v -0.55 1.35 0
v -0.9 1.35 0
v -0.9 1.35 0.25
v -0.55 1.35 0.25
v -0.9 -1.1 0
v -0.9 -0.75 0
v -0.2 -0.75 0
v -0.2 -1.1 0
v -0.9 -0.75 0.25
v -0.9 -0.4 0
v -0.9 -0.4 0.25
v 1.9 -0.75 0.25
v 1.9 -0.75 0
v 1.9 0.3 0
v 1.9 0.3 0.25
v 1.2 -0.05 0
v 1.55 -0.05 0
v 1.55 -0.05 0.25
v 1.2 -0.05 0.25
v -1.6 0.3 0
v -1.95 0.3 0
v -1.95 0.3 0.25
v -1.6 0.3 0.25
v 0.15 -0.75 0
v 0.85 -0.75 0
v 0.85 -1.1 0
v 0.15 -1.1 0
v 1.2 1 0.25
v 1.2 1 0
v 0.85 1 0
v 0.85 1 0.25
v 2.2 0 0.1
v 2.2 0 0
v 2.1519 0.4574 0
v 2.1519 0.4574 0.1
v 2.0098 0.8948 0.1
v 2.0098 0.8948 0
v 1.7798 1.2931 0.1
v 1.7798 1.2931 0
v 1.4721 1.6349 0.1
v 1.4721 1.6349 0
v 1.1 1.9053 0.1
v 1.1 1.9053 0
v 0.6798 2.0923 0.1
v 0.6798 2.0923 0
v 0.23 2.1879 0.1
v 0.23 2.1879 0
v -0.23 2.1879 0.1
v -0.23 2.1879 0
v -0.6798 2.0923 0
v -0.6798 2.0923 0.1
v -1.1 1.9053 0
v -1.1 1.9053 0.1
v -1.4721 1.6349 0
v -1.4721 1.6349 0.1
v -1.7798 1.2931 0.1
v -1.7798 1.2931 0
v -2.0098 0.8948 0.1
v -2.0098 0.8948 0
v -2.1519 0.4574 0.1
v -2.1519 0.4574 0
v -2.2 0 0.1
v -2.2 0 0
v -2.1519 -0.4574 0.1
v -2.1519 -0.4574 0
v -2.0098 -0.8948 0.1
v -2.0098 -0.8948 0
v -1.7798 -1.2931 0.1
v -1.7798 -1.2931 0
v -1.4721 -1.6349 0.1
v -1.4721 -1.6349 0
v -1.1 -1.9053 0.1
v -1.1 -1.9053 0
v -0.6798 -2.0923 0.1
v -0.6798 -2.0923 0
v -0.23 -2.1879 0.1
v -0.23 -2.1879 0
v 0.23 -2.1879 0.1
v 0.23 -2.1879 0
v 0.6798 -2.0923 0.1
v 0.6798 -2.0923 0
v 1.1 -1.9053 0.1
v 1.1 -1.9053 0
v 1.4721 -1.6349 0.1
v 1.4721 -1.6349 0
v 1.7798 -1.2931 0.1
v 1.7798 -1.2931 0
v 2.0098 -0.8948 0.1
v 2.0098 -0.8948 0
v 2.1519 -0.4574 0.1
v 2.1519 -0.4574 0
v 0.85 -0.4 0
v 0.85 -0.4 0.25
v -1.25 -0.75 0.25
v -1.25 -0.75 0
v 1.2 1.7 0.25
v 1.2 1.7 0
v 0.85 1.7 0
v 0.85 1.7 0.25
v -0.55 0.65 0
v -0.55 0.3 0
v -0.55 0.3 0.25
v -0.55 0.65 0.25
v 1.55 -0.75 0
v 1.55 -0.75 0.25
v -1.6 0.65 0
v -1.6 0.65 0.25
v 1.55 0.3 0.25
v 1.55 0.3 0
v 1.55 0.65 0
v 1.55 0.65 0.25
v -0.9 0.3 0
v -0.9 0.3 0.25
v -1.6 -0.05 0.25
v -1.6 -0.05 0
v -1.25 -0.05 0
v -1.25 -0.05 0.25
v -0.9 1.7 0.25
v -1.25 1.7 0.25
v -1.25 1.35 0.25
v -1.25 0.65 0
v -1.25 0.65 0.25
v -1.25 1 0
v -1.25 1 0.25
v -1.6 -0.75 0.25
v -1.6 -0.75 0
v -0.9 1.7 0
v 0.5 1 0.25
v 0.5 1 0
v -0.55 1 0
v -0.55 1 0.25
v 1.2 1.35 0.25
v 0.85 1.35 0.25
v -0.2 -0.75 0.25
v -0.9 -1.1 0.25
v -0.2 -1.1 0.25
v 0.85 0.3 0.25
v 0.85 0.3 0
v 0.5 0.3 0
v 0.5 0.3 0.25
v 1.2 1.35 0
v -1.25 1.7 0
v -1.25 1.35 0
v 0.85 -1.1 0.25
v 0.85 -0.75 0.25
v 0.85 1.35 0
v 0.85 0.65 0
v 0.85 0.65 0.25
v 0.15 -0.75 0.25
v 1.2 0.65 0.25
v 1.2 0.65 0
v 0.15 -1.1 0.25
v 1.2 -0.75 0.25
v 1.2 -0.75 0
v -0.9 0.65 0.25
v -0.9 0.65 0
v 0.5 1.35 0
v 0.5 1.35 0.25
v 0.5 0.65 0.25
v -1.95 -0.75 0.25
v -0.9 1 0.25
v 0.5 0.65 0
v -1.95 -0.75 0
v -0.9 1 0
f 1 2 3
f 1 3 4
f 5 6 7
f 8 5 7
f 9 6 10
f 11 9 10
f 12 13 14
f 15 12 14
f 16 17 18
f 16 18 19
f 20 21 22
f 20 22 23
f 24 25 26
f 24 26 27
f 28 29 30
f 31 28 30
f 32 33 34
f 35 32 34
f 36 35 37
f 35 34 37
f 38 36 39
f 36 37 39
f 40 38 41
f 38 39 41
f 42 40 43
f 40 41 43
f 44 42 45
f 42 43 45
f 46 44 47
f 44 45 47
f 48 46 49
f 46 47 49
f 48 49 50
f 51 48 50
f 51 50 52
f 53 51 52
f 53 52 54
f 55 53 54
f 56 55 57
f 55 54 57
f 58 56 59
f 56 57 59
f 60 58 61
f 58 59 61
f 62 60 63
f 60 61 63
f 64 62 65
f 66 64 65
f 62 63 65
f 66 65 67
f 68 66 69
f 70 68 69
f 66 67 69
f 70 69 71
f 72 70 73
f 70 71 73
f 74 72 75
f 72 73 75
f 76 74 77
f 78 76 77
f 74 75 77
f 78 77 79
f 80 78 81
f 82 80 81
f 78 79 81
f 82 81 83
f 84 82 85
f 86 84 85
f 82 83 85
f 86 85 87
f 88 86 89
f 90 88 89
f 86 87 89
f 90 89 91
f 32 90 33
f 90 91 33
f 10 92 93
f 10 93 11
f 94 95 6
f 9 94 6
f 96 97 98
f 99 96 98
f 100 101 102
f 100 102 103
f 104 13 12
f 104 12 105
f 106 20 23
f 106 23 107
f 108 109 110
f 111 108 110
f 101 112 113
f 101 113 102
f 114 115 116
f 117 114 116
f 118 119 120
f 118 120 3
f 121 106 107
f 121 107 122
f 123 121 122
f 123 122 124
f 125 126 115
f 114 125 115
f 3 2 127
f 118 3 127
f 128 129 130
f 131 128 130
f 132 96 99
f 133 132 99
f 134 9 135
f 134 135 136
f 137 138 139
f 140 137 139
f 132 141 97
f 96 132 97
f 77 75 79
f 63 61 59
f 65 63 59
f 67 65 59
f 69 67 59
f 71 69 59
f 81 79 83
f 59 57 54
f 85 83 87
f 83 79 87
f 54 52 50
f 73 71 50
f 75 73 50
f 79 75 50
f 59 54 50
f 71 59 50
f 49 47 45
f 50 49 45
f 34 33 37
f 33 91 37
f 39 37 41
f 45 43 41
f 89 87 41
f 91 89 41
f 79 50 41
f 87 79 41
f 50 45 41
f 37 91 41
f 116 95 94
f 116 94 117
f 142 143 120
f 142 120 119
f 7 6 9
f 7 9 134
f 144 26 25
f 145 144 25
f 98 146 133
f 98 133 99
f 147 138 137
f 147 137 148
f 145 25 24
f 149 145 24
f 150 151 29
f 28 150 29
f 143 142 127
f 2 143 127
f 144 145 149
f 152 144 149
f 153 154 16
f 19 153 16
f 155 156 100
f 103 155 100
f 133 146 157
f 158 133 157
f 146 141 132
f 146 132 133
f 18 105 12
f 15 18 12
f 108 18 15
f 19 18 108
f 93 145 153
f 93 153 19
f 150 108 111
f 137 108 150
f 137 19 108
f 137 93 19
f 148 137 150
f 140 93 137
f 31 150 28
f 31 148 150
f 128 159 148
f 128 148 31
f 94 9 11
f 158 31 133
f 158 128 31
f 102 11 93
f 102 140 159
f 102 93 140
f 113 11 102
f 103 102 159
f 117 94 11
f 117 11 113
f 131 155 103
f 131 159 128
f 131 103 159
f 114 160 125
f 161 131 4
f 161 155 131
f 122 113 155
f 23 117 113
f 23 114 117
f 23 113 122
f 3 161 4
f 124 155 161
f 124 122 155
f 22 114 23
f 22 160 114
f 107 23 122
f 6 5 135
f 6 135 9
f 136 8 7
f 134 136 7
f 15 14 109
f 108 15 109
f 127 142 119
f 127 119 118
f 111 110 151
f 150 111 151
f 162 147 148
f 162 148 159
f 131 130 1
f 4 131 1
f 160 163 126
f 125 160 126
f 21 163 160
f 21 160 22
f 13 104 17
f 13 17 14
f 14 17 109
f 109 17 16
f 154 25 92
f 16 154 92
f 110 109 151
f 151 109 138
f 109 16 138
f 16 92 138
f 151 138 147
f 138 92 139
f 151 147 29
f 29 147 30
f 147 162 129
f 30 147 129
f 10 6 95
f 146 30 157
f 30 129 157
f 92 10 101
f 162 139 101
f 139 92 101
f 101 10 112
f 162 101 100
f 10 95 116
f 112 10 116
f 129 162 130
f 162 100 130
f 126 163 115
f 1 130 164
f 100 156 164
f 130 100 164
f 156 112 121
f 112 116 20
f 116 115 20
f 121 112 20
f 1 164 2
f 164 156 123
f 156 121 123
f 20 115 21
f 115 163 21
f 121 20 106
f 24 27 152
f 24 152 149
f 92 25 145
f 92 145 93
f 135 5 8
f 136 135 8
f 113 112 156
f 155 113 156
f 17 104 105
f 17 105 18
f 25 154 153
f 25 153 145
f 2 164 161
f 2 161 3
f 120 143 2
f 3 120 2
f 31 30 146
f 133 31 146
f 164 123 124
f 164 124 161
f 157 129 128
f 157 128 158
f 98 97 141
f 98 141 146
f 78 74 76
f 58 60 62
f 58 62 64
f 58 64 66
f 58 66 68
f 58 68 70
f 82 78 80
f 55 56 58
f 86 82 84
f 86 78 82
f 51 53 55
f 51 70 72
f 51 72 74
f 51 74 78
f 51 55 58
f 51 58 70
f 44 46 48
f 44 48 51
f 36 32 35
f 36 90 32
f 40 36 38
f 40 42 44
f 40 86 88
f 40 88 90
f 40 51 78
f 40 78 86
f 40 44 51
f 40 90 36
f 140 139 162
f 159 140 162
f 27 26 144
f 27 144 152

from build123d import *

# Parameters (mm, degrees)
CYLINDER_R     = 2.2
CYLINDER_DEPTH = 0.1
BOX009_W       = 0.35
BOX009_H       = 0.7
BOX009_DEPTH   = 1
BOX010_W       = 1.05
BOX010_H       = 0.35
BOX010_DEPTH   = 1
BOX007_W       = 1.75
BOX007_H       = 0.35
BOX007_DEPTH   = 0.25
BOX001_W       = 0.35
BOX001_H       = 0.35
BOX001_DEPTH   = 1
BOX003_W       = 1.4
BOX003_H       = 0.35
BOX003_DEPTH   = 0.25
BOX008_W       = 0.35
BOX008_H       = 0.35
BOX008_DEPTH   = 0.25
BOX005_W       = 1.75
BOX005_H       = 0.35
BOX005_DEPTH   = 0.25
BOX004_W       = 1.75
BOX004_H       = 0.35
BOX004_DEPTH   = 0.25
BOX002_W       = 1.05
BOX002_H       = 0.35
BOX002_DEPTH   = 0.25
BOX_W          = 0.35
BOX_H          = 0.35
BOX_DEPTH      = 0.25
BOX012_W       = 1.05
BOX012_H       = 0.35
BOX012_DEPTH   = 1
BOX011_W       = 1.75
BOX011_H       = 0.35
BOX011_DEPTH   = 1
BOX006_W       = 1.75
BOX006_H       = 0.35
BOX006_DEPTH   = 0.25
BOX013_W       = 1.4
BOX013_H       = 0.35
BOX013_DEPTH   = 0.25


with BuildPart() as cylinder:
    # Cylinder → Cylinder (new body)
    with BuildSketch(Plane.XY):
        Circle(CYLINDER_R)
    extrude(amount=CYLINDER_DEPTH)


with BuildPart() as cube009:
    # Box009 → Box009 (new body)
    with BuildSketch(Plane(origin=(-1.35, -1.1, 0), x_dir=(1, 0, 0), z_dir=(0, 0, 1))):
        with Locations((0.175, 0.35)):
            Rectangle(BOX009_W, BOX009_H)
    extrude(amount=BOX009_DEPTH)


with BuildPart() as cube010:
    # Box010 → Box010 (new body)
    with BuildSketch(Plane(origin=(-1.7, -1.45, 0), x_dir=(1, 0, 0), z_dir=(0, 0, 1))):
        with Locations((0.525, 0.175)):
            Rectangle(BOX010_W, BOX010_H)
    extrude(amount=BOX010_DEPTH)


with BuildPart() as cut001:
    # Box007 → Box007 (new body)
    with BuildSketch(Plane(origin=(-1.7, -1.45, 0), x_dir=(1, 0, 0), z_dir=(0, 0, 1))):
        with Locations((0.875, 0.175)):
            Rectangle(BOX007_W, BOX007_H)
    extrude(amount=BOX007_DEPTH)

    # Cut001: cut Cube010
    add(cube010.part, mode=Mode.SUBTRACT)


with BuildPart() as cube001:
    # Box001 → Box001 (new body)
    with BuildSketch(Plane(origin=(-0.65, -0.05, 0), x_dir=(1, 0, 0), z_dir=(0, 0, 1))):
        with Locations((0.175, 0.175)):
            Rectangle(BOX001_W, BOX001_H)
    extrude(amount=BOX001_DEPTH)


with BuildPart() as cut:
    # Box003 → Box003 (new body)
    with BuildSketch(Plane(origin=(-1.35, -0.05, 0), x_dir=(1, 0, 0), z_dir=(0, 0, 1))):
        with Locations((0.7, 0.175)):
            Rectangle(BOX003_W, BOX003_H)
    extrude(amount=BOX003_DEPTH)

    # Cut: cut Cube001
    add(cube001.part, mode=Mode.SUBTRACT)


with BuildPart() as cube008:
    # Box008 → Box008 (new body)
    with BuildSketch(Plane(origin=(-0.65, 0.65, 0), x_dir=(1, 0, 0), z_dir=(0, 0, 1))):
        with Locations((0.175, 0.175)):
            Rectangle(BOX008_W, BOX008_H)
    extrude(amount=BOX008_DEPTH)


with BuildPart() as cube005:
    # Box005 → Box005 (new body)
    with BuildSketch(Plane(origin=(-1.7, -0.75, 0), x_dir=(1, 0, 0), z_dir=(0, 0, 1))):
        with Locations((0.875, 0.175)):
            Rectangle(BOX005_W, BOX005_H)
    extrude(amount=BOX005_DEPTH)


with BuildPart() as cube004:
    # Box004 → Box004 (new body)
    with BuildSketch(Plane(origin=(-1.7, -0.4, 0), x_dir=(1, 0, 0), z_dir=(0, 0, 1))):
        with Locations((0.875, 0.175)):
            Rectangle(BOX004_W, BOX004_H)
    extrude(amount=BOX004_DEPTH)


with BuildPart() as cube002:
    # Box002 → Box002 (new body)
    with BuildSketch(Plane(origin=(-1, 0.3, 0), x_dir=(1, 0, 0), z_dir=(0, 0, 1))):
        with Locations((0.525, 0.175)):
            Rectangle(BOX002_W, BOX002_H)
    extrude(amount=BOX002_DEPTH)


with BuildPart() as cube:
    # Box → Box (new body)
    with BuildSketch(Plane(origin=(-1, 1, 0), x_dir=(1, 0, 0), z_dir=(0, 0, 1))):
        with Locations((0.175, 0.175)):
            Rectangle(BOX_W, BOX_H)
    extrude(amount=BOX_DEPTH)


with BuildPart() as cube012:
    # Box012 → Box012 (new body)
    with BuildSketch(Plane(origin=(-1.7, -1.45, 0), x_dir=(1, 0, 0), z_dir=(0, 0, 1))):
        with Locations((0.525, 0.175)):
            Rectangle(BOX012_W, BOX012_H)
    extrude(amount=BOX012_DEPTH)


with BuildPart() as cut002:
    # Box011 → Box011 (new body)
    with BuildSketch(Plane(origin=(-1.7, -1.45, 0), x_dir=(1, 0, 0), z_dir=(0, 0, 1))):
        with Locations((0.875, 0.175)):
            Rectangle(BOX011_W, BOX011_H)
    extrude(amount=BOX011_DEPTH)

    # Cut002: cut Cube012
    add(cube012.part, mode=Mode.SUBTRACT)


with BuildPart() as cut002_1:
    # Cut002 placement: moved
    add(cut002.part.moved(Location((0, 0.35, 0))))


with BuildPart() as left_side:
    # Box006 → Box006 (new body)
    with BuildSketch(Plane(origin=(-1.7, -1.1, 0), x_dir=(1, 0, 0), z_dir=(0, 0, 1))):
        with Locations((0.875, 0.175)):
            Rectangle(BOX006_W, BOX006_H)
    extrude(amount=BOX006_DEPTH)

    # Cut003: cut Cut002
    add(cut002_1.part, mode=Mode.SUBTRACT)

    # Fusion: union Cut001, Cut, Cube008, Cube005, Cube004, Cube002, Cube
    add(cut001.part)
    add(cut.part)
    add(cube008.part)
    add(cube005.part)
    add(cube004.part)
    add(cube002.part)
    add(cube.part)

    # Cut004: cut Cube009
    add(cube009.part, mode=Mode.SUBTRACT)


with BuildPart() as left_side_mirrored:
    # Mirror: instance of left_side
    add(left_side.part.mirror(Plane(origin=(0.05, 0.65, 0), x_dir=(0, 1, 0), z_dir=(-1, 0, 0))))


with BuildPart() as left_side_mirrored_1:
    # Mirror placement: moved
    add(left_side_mirrored.part.moved(Location((0.35, 0, 0))))


with BuildPart() as cube013:
    # Box013 → Box013 (new body)
    with BuildSketch(Plane(origin=(0.4, -0.75, 0), x_dir=(0, 1, 0), z_dir=(0, 0, 1))):
        with Locations((0.7, 0.175)):
            Rectangle(BOX013_W, BOX013_H)
    extrude(amount=BOX013_DEPTH)


with BuildPart() as fusion001:
    # Fusion001 base: copy of left_side
    add(left_side.part)

    # Fusion001: union left_side (mirrored), Cube013
    add(left_side_mirrored_1.part)
    add(cube013.part)


with BuildPart() as fusion001_1:
    # Fusion001 placement: moved
    add(fusion001.part.moved(Location((-0.25, 0.35, 0))))


solid = Compound([cylinder.part, fusion001_1.part])
